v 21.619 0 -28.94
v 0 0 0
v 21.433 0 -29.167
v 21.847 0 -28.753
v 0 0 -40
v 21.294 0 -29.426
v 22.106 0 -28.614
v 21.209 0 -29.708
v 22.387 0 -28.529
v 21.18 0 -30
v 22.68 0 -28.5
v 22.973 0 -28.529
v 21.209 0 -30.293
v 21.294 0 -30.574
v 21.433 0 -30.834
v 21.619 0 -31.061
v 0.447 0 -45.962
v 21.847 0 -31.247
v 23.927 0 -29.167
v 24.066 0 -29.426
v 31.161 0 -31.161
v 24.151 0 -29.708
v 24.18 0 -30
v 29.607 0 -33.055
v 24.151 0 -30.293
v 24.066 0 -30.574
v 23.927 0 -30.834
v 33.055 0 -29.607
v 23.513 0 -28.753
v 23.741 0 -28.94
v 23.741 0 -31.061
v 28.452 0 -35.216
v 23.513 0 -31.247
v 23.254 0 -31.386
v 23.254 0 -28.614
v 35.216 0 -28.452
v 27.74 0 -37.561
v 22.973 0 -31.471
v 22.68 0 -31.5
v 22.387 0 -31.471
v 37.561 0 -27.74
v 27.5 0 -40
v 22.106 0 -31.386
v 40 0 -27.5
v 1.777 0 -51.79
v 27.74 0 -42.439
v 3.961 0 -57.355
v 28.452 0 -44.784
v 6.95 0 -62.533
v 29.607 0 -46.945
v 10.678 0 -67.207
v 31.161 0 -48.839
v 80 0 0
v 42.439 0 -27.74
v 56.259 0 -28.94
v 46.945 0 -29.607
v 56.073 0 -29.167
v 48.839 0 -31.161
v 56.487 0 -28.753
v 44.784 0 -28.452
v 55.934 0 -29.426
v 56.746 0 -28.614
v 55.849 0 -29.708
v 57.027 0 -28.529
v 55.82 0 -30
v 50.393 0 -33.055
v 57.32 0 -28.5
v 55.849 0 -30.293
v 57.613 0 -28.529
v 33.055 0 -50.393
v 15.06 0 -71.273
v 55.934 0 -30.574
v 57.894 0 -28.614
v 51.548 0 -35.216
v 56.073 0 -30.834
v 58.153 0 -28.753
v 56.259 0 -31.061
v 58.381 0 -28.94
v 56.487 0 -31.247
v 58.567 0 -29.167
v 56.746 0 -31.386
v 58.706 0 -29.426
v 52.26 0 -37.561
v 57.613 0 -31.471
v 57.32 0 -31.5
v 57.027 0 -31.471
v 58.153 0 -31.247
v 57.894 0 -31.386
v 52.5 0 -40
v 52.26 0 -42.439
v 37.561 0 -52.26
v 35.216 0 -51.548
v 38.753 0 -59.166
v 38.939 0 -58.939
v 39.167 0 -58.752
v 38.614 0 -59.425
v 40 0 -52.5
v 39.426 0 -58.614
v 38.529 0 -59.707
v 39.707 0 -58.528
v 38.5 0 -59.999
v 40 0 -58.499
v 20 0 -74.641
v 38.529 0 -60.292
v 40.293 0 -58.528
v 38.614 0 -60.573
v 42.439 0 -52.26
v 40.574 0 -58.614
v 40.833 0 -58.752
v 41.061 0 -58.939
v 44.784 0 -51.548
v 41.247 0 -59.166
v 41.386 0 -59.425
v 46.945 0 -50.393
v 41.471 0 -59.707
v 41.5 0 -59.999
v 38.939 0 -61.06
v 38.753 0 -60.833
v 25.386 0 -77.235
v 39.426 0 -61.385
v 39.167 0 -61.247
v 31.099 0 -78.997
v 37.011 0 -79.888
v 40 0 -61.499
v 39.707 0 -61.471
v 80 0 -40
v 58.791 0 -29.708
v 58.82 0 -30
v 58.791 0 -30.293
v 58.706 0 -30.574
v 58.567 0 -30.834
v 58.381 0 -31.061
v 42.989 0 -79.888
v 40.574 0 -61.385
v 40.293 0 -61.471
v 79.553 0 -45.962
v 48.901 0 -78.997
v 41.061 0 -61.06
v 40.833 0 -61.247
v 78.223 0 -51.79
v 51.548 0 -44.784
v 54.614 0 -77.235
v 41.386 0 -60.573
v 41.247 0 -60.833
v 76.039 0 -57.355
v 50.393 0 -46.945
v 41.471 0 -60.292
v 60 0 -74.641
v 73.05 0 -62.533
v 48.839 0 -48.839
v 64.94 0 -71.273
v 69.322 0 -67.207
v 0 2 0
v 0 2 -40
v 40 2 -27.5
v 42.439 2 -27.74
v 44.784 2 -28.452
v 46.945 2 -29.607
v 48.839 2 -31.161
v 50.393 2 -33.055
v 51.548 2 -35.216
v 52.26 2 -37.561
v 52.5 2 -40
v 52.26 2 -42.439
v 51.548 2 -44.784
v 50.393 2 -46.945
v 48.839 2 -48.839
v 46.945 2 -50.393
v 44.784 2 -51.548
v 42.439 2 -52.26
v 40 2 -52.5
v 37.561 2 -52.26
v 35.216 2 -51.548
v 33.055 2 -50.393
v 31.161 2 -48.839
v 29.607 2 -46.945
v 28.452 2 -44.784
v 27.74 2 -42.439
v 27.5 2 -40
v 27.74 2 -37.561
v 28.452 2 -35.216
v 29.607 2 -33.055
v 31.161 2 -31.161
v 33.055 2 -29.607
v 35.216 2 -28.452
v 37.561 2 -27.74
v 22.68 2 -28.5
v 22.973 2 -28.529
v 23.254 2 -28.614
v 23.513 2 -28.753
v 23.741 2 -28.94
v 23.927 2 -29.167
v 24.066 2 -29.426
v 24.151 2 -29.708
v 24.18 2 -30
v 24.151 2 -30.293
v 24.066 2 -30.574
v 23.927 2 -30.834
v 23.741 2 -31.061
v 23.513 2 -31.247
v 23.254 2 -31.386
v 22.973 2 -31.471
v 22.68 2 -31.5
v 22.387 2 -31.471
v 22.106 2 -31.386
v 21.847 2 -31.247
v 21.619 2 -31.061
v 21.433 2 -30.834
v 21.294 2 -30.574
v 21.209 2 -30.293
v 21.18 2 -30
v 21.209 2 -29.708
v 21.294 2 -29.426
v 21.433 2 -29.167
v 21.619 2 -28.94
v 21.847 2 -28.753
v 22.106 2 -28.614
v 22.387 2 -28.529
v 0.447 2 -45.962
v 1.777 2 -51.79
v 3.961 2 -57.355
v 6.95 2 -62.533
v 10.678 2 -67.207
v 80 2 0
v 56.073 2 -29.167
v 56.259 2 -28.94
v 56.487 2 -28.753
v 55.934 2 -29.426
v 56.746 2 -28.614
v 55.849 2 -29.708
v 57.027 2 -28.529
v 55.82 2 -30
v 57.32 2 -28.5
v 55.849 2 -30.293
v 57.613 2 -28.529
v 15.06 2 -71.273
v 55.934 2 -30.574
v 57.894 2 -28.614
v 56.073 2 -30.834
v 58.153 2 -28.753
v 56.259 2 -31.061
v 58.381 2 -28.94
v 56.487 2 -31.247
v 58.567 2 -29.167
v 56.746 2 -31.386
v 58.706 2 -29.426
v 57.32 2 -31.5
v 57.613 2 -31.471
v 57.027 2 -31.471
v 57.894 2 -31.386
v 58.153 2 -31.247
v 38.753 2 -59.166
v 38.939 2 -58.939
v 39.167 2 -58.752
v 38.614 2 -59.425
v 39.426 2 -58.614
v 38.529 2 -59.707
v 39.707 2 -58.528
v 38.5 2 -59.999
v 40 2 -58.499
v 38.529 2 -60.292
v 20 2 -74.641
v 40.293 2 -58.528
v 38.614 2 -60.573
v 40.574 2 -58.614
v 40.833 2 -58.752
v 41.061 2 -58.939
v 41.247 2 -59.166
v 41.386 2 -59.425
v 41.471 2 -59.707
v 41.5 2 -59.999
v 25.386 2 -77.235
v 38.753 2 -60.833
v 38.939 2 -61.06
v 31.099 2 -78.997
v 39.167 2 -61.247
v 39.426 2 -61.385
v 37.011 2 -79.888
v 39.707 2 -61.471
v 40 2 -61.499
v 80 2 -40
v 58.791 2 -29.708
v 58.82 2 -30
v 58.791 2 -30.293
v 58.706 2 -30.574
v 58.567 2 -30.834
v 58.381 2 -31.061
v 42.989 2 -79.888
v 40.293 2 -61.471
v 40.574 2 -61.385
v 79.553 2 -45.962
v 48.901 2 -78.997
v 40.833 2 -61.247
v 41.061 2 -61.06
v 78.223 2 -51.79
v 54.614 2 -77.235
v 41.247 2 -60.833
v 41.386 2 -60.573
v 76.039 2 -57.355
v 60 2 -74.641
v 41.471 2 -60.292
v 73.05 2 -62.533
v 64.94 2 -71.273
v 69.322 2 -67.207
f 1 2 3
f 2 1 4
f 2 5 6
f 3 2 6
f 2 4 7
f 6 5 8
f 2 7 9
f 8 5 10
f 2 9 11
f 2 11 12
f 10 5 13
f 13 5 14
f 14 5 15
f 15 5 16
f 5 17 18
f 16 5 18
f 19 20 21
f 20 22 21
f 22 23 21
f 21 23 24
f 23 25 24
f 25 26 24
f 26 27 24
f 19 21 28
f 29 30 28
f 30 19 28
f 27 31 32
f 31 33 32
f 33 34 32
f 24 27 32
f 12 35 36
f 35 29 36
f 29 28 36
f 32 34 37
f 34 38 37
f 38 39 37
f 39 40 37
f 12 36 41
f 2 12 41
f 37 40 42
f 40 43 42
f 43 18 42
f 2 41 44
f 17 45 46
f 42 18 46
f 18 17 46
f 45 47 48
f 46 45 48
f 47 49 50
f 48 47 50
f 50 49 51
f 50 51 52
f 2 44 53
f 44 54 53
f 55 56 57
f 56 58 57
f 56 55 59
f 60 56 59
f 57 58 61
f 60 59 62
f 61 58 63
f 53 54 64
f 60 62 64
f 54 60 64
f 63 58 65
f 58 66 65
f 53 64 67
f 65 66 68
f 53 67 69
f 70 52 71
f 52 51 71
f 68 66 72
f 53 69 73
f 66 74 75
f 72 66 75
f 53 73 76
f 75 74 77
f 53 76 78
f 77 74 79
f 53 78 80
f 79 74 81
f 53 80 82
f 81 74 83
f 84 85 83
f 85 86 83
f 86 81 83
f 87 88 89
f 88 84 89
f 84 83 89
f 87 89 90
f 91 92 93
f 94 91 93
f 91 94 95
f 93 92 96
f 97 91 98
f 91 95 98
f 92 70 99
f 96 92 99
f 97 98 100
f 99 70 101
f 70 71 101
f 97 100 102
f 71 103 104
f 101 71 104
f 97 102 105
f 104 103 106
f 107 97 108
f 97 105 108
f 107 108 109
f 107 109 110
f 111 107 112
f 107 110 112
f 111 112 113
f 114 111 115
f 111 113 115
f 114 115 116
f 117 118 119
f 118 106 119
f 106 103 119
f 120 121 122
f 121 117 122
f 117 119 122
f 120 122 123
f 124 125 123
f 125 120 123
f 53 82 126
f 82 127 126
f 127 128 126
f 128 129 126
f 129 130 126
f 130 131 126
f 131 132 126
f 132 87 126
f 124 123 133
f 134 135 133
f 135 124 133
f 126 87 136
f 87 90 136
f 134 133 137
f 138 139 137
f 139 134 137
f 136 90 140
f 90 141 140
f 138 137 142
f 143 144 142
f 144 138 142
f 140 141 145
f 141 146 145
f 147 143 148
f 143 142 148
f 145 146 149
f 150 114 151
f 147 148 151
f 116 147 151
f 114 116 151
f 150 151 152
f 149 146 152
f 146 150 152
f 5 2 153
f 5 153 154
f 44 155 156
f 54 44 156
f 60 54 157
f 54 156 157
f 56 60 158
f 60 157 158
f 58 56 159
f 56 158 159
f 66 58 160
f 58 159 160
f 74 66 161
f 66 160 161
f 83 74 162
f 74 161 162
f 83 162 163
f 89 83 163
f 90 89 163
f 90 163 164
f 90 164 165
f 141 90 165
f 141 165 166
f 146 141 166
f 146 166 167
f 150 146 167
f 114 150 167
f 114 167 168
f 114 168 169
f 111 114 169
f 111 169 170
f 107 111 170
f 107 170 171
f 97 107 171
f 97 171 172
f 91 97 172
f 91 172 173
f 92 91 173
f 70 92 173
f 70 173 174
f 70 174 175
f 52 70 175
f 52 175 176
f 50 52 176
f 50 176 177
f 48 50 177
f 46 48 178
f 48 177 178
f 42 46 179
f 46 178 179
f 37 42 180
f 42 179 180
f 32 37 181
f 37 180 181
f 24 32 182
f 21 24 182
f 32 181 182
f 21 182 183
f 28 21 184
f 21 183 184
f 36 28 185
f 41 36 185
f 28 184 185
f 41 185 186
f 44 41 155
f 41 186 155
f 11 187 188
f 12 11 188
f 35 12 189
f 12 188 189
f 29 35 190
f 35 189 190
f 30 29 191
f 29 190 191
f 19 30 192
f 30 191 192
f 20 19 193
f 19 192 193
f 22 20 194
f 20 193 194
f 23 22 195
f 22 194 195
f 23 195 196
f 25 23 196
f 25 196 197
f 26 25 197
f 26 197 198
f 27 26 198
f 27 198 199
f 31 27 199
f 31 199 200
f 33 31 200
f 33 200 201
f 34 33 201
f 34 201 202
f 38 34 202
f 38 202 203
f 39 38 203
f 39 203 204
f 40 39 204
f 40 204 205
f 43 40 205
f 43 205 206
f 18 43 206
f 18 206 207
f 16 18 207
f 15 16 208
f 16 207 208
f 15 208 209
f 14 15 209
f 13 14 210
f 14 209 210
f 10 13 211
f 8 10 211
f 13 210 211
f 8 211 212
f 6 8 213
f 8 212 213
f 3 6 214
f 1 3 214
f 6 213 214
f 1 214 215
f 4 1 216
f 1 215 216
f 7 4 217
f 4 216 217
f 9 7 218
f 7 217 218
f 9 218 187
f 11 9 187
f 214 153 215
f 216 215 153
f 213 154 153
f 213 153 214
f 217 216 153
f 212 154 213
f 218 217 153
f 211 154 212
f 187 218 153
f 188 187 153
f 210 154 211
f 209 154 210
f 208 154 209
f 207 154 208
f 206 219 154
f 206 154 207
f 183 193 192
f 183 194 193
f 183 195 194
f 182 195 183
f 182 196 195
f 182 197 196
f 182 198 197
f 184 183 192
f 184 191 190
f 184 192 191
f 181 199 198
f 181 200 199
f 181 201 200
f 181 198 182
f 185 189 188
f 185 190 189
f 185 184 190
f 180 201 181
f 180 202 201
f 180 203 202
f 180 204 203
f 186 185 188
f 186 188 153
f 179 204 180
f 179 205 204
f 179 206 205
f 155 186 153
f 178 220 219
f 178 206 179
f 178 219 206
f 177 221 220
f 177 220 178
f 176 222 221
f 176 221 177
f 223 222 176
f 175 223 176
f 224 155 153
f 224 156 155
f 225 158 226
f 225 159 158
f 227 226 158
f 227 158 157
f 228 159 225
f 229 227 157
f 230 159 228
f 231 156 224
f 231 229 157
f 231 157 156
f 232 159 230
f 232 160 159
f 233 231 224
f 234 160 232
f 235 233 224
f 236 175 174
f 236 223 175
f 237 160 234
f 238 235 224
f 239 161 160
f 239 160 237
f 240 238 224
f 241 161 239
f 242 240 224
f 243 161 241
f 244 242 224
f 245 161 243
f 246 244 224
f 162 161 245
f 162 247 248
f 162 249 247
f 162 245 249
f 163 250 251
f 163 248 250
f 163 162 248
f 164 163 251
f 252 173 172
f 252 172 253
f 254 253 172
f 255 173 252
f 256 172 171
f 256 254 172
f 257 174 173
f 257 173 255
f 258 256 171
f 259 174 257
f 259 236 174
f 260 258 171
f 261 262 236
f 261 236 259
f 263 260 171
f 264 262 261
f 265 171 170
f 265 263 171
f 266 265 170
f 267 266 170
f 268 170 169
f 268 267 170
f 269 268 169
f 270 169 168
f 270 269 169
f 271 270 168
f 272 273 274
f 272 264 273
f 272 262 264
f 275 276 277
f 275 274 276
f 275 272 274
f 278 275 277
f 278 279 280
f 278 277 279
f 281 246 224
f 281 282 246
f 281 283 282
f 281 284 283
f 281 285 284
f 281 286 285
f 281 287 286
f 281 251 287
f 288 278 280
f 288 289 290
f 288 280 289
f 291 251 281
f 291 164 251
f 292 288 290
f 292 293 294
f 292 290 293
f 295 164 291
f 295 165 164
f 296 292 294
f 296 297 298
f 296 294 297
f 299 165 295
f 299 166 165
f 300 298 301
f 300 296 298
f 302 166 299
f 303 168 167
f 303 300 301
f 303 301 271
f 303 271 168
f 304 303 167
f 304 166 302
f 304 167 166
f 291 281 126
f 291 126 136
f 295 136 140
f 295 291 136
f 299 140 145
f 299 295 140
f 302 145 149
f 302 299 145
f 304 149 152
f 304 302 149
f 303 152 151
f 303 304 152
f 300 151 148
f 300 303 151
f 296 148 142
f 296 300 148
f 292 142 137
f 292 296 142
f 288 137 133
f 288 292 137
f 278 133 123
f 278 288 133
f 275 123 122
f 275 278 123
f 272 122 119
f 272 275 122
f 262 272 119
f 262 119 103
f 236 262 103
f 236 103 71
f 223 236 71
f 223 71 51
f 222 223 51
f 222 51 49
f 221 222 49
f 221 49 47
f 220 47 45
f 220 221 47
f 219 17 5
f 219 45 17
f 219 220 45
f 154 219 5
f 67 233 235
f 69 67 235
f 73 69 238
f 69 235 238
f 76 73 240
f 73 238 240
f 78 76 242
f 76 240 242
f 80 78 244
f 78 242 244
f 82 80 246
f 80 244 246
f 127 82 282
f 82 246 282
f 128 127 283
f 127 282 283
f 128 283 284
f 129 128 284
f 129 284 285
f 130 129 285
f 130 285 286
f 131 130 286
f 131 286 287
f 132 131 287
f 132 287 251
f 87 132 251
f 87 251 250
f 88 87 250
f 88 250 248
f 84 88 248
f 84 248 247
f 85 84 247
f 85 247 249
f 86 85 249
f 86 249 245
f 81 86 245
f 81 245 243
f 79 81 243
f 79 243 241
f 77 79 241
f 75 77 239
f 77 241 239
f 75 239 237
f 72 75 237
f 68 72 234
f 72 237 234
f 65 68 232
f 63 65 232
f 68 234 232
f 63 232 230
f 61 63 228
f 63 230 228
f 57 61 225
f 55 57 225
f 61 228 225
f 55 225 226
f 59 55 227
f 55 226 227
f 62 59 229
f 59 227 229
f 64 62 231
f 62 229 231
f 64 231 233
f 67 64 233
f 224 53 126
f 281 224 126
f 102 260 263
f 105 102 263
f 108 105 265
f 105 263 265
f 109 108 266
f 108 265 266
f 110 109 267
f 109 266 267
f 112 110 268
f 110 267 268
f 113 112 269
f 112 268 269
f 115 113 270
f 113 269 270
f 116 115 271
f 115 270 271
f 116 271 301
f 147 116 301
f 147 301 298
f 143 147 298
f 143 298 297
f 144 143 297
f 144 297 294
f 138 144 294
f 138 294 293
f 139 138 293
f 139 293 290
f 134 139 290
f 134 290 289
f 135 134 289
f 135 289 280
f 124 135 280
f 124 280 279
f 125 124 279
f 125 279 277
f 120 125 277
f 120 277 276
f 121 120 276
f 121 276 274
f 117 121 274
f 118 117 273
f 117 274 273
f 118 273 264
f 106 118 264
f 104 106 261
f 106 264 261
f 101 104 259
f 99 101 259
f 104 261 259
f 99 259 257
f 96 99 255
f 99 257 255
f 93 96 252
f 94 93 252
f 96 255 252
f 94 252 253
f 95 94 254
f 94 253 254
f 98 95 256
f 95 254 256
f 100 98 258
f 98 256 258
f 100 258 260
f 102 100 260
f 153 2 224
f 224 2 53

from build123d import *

# Parameters (mm, degrees)
SKETCH1_W           = 80
SKETCH1_H           = 80
BOSS_EXTRUDE1_DEPTH = 2
SKETCH3_R           = 12.5
CUT_EXTRUDE2_DEPTH  = 114.154761279
SKETCH5_R           = 1.5
CUT_EXTRUDE3_DEPTH  = 114.154761279
FILLET1_RADIUS      = 40
FILLET1_LENGTH      = 2


with BuildPart() as part:
    # Sketch1 → Boss-Extrude1 (new body)
    with BuildSketch(Plane(origin=(0, 0, 0), x_dir=(1, 0, 0), z_dir=(0, 1, 0))):
        with Locations((40, 40)):
            Rectangle(SKETCH1_W, SKETCH1_H)
    extrude(amount=BOSS_EXTRUDE1_DEPTH)

    # Sketch3 → Cut-Extrude2 (cut, through all)
    with BuildSketch(Plane(origin=(0, 2, 0), x_dir=(1, 0, 0), z_dir=(0, 1, 0))):
        with Locations(Location((40, 40, 0), (0, 0, 270))):
            Circle(SKETCH3_R)
    extrude(amount=-CUT_EXTRUDE2_DEPTH, mode=Mode.SUBTRACT)

    # Sketch5 → Cut-Extrude3 (cut, through all)
    with BuildSketch(Plane(origin=(0, 2, 0), x_dir=(1, 0, 0), z_dir=(0, 1, 0))):
        with Locations(Location((22.68, 30.000293338, 0), (0, 0, 270))):
            Circle(SKETCH5_R)
        with Locations(Location((57.32, 30.000293338, 0), (0, 0, 270))):
            Circle(SKETCH5_R)
        with Locations(Location((40, 59.999413325, 0), (0, 0, 270))):
            Circle(SKETCH5_R)
    extrude(amount=-CUT_EXTRUDE3_DEPTH, mode=Mode.SUBTRACT)

    # Fillet1: full round fillet: the end face becomes a half cylinder, R = half its width
    fillet1_face = Plane((40, 1, -80), x_dir=(0, 1, 0), z_dir=(0, 0, -1))  # on the end face: x along it, z out of the body
    fillet1_slab = fillet1_face.offset(-FILLET1_RADIUS / 2) * Box(FILLET1_LENGTH, 2 * FILLET1_RADIUS, FILLET1_RADIUS, mode=Mode.PRIVATE)  # the body's end, R deep
    fillet1_round = Plane((40, 1, -40), x_dir=(0, 0, -1), z_dir=(0, 1, 0)) * Cylinder(FILLET1_RADIUS, FILLET1_LENGTH, mode=Mode.PRIVATE)  # its axis R under the face
    add(fillet1_slab - fillet1_round, mode=Mode.SUBTRACT)


solid = part.part
